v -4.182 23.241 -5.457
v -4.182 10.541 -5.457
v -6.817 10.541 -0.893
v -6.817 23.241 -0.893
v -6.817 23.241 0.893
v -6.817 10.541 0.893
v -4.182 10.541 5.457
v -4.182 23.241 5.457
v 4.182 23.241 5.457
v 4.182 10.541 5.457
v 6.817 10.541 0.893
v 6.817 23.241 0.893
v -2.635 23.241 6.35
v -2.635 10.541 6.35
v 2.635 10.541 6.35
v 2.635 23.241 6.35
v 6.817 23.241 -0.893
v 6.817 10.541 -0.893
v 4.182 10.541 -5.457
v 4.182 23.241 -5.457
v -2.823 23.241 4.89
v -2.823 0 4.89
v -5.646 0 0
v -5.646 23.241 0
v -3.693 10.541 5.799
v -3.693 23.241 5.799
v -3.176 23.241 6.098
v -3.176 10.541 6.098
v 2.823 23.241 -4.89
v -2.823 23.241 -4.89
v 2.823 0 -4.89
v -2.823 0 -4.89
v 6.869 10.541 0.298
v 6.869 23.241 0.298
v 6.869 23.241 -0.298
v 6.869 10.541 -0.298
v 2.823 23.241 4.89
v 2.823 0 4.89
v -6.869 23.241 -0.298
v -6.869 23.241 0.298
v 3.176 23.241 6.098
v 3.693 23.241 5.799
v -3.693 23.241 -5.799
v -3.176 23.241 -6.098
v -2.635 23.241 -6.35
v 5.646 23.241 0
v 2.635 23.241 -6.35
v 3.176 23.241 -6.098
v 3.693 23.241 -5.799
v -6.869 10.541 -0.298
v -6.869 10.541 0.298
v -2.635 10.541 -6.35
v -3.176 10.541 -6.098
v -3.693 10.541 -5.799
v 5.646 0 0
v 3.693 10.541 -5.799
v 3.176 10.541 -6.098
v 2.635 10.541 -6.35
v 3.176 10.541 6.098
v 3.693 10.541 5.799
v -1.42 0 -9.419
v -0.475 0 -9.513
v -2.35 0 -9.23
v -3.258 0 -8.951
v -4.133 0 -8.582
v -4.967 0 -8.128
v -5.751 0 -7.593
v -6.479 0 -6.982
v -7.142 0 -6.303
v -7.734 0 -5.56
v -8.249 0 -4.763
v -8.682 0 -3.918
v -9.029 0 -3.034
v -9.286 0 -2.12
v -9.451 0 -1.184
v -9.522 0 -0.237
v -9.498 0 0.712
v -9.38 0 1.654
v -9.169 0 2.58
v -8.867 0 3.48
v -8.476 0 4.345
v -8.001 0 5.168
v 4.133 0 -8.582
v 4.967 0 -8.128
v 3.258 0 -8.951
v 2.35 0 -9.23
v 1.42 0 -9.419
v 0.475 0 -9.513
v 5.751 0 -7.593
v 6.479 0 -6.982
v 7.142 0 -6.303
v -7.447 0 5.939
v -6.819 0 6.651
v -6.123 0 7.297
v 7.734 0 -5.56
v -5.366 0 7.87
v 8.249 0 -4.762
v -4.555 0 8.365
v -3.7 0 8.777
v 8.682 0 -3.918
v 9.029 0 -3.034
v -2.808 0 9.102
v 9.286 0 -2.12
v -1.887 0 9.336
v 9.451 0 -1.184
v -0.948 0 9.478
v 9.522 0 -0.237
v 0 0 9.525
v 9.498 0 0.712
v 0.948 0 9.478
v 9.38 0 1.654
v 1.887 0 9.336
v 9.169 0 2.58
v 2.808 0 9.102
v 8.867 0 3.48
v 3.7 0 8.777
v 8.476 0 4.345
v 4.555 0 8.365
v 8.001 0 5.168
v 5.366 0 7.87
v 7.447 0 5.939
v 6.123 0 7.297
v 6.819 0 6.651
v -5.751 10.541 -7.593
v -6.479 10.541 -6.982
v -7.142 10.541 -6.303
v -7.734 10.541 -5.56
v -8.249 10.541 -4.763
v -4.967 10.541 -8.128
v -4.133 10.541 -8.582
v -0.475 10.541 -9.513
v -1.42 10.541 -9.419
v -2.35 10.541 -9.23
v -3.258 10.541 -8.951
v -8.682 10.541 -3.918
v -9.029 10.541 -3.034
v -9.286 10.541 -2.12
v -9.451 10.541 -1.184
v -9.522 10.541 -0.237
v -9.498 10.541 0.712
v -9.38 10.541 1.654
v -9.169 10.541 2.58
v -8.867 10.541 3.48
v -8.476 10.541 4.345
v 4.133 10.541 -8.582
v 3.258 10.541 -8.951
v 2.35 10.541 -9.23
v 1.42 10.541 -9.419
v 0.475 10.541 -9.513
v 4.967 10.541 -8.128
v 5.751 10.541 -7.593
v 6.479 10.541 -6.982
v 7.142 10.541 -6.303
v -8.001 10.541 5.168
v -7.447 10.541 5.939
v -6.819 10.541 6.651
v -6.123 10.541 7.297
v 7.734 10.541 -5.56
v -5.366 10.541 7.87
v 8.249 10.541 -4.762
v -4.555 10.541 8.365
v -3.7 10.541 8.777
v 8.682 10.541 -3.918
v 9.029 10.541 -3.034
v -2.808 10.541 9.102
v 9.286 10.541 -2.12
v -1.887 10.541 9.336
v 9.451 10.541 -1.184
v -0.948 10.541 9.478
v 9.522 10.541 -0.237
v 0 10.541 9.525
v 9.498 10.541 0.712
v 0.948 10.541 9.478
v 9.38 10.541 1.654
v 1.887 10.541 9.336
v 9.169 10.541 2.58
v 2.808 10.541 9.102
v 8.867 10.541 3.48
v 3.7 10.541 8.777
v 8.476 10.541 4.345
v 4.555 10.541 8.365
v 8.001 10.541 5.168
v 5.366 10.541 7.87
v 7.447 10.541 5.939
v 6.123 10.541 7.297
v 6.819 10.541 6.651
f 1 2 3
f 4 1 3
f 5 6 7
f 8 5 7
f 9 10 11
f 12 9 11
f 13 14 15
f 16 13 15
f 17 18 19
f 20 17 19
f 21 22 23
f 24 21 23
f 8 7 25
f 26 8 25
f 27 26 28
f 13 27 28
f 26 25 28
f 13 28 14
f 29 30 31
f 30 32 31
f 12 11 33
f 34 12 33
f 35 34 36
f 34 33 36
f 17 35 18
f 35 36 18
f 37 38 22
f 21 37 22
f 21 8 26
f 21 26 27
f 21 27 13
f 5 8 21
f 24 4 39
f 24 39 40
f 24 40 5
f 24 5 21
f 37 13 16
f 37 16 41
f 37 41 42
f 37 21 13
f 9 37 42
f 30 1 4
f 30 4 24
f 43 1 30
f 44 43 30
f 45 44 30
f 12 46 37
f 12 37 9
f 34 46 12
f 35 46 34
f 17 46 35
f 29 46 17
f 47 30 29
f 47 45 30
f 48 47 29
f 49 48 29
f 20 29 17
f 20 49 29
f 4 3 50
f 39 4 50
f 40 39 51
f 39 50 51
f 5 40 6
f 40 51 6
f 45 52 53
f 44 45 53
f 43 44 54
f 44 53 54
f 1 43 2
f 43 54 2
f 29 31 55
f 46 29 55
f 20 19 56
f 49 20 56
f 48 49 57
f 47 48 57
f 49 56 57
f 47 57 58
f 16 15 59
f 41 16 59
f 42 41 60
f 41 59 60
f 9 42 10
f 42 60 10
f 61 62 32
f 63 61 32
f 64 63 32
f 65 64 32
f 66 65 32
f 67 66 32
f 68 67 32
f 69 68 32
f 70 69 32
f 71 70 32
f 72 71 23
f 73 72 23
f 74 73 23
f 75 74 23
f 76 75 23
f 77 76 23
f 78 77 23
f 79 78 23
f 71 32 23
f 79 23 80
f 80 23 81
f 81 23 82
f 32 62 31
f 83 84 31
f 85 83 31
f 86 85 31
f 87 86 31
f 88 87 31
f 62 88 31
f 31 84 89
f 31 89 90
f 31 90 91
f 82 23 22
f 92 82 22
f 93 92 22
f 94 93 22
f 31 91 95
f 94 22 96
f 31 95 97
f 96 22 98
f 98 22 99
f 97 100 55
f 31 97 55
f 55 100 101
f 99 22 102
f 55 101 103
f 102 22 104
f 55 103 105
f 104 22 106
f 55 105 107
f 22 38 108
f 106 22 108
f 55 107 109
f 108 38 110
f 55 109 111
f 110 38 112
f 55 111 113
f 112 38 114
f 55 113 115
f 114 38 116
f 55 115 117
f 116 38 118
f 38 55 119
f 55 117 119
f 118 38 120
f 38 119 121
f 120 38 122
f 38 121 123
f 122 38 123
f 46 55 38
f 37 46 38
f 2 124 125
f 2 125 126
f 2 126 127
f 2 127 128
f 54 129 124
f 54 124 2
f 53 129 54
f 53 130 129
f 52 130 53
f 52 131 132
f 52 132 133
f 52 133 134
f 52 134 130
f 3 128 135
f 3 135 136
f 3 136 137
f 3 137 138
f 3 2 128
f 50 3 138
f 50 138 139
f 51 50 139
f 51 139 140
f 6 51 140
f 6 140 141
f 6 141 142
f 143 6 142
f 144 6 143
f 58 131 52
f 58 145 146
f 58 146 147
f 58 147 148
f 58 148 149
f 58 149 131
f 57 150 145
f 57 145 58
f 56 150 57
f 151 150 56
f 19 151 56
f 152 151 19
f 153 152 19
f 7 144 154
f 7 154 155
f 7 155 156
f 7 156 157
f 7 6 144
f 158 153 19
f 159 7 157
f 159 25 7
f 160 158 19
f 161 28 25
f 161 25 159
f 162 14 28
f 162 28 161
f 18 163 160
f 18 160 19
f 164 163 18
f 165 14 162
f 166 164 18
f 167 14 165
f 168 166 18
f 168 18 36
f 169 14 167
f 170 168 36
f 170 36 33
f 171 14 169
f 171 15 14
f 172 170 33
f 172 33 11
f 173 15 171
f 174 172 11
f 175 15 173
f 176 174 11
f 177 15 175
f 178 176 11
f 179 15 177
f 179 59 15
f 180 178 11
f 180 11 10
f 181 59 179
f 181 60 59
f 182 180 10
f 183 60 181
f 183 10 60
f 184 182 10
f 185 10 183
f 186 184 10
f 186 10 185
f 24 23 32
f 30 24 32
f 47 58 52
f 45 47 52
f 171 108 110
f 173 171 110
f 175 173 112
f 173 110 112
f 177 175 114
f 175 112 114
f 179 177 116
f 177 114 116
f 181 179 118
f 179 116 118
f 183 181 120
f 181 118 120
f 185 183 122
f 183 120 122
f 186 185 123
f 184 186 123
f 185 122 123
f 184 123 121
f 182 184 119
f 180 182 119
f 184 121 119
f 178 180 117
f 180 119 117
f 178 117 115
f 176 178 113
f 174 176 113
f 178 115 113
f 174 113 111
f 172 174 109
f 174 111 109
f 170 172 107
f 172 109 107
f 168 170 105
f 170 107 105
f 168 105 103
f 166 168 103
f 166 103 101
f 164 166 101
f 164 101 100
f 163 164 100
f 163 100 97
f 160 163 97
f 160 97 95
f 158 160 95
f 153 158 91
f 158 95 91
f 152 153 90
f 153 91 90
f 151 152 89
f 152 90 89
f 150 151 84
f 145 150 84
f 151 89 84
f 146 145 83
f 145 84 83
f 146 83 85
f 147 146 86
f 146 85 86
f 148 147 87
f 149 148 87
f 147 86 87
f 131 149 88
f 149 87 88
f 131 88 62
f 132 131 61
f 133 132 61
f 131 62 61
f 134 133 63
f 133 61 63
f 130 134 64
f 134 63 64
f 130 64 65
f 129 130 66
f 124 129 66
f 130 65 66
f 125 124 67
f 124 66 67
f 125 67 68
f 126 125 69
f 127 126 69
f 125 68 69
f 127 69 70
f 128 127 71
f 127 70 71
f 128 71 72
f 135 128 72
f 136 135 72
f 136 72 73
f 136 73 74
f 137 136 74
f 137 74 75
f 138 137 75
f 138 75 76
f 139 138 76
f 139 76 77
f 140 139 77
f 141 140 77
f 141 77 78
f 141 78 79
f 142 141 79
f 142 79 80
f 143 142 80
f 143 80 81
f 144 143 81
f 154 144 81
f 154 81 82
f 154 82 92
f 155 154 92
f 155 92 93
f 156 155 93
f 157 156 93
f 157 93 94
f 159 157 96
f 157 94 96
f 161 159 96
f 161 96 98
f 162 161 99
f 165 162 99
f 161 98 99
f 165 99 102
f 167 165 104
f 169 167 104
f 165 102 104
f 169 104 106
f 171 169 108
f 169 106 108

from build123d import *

# Parameters (mm, degrees)
SKETCH1_R           = 9.525
BOSS_EXTRUDE1_DEPTH = 10.541
BOSS_EXTRUDE2_DEPTH = 12.7


with BuildPart() as part:
    # Sketch1 → Boss-Extrude1 (new body)
    with BuildSketch(Plane(origin=(0, 0, 0), x_dir=(1, 0, 0), z_dir=(0, 1, 0))):
        with Locations(Location((0, 0, 0), (0, 0, 270))):
            Circle(SKETCH1_R)
        Polygon((5.645908282, 0), (2.822954141, 4.8895), (-2.822954141, 4.8895), (-5.645908282, 0), (-2.822954141, -4.8895), (2.822954141, -4.8895), align=None, mode=Mode.SUBTRACT)
    extrude(amount=BOSS_EXTRUDE1_DEPTH)

    # Sketch2 → Boss-Extrude2 (add)
    with BuildSketch(Plane(origin=(0, 10.541, 0), x_dir=(1, 0, 0), z_dir=(0, 1, 0))):
        with BuildLine():
            Line((4.181770802, -5.456960506), (6.816751826, -0.893039494))
            ThreePointArc((6.816751826, -0.893039494), (6.875, 0), (6.816751826, 0.893039494))
            Line((6.816751826, 0.893039494), (4.181770802, 5.456960506))
            ThreePointArc((4.181770802, 5.456960506), (3.4375, 5.953924651), (2.634981025, 6.35))
            Line((2.634981025, 6.35), (-2.634981025, 6.35))
            ThreePointArc((-2.634981025, 6.35), (-3.4375, 5.953924651), (-4.181770802, 5.456960506))
            Line((-4.181770802, 5.456960506), (-6.816751826, 0.893039494))
            ThreePointArc((-6.816751826, 0.893039494), (-6.875, 0), (-6.816751826, -0.893039494))
            Line((-6.816751826, -0.893039494), (-4.181770802, -5.456960506))
            ThreePointArc((-4.181770802, -5.456960506), (-3.4375, -5.953924651), (-2.634981025, -6.35))
            Line((-2.634981025, -6.35), (2.634981025, -6.35))
            ThreePointArc((2.634981025, -6.35), (3.4375, -5.953924651), (4.181770802, -5.456960506))
        make_face()
        Polygon((-2.822954141, 4.8895), (2.822954141, 4.8895), (5.645908282, 0), (2.822954141, -4.8895), (-2.822954141, -4.8895), (-5.645908282, 0), align=None, mode=Mode.SUBTRACT)
    extrude(amount=BOSS_EXTRUDE2_DEPTH)


solid = part.part
